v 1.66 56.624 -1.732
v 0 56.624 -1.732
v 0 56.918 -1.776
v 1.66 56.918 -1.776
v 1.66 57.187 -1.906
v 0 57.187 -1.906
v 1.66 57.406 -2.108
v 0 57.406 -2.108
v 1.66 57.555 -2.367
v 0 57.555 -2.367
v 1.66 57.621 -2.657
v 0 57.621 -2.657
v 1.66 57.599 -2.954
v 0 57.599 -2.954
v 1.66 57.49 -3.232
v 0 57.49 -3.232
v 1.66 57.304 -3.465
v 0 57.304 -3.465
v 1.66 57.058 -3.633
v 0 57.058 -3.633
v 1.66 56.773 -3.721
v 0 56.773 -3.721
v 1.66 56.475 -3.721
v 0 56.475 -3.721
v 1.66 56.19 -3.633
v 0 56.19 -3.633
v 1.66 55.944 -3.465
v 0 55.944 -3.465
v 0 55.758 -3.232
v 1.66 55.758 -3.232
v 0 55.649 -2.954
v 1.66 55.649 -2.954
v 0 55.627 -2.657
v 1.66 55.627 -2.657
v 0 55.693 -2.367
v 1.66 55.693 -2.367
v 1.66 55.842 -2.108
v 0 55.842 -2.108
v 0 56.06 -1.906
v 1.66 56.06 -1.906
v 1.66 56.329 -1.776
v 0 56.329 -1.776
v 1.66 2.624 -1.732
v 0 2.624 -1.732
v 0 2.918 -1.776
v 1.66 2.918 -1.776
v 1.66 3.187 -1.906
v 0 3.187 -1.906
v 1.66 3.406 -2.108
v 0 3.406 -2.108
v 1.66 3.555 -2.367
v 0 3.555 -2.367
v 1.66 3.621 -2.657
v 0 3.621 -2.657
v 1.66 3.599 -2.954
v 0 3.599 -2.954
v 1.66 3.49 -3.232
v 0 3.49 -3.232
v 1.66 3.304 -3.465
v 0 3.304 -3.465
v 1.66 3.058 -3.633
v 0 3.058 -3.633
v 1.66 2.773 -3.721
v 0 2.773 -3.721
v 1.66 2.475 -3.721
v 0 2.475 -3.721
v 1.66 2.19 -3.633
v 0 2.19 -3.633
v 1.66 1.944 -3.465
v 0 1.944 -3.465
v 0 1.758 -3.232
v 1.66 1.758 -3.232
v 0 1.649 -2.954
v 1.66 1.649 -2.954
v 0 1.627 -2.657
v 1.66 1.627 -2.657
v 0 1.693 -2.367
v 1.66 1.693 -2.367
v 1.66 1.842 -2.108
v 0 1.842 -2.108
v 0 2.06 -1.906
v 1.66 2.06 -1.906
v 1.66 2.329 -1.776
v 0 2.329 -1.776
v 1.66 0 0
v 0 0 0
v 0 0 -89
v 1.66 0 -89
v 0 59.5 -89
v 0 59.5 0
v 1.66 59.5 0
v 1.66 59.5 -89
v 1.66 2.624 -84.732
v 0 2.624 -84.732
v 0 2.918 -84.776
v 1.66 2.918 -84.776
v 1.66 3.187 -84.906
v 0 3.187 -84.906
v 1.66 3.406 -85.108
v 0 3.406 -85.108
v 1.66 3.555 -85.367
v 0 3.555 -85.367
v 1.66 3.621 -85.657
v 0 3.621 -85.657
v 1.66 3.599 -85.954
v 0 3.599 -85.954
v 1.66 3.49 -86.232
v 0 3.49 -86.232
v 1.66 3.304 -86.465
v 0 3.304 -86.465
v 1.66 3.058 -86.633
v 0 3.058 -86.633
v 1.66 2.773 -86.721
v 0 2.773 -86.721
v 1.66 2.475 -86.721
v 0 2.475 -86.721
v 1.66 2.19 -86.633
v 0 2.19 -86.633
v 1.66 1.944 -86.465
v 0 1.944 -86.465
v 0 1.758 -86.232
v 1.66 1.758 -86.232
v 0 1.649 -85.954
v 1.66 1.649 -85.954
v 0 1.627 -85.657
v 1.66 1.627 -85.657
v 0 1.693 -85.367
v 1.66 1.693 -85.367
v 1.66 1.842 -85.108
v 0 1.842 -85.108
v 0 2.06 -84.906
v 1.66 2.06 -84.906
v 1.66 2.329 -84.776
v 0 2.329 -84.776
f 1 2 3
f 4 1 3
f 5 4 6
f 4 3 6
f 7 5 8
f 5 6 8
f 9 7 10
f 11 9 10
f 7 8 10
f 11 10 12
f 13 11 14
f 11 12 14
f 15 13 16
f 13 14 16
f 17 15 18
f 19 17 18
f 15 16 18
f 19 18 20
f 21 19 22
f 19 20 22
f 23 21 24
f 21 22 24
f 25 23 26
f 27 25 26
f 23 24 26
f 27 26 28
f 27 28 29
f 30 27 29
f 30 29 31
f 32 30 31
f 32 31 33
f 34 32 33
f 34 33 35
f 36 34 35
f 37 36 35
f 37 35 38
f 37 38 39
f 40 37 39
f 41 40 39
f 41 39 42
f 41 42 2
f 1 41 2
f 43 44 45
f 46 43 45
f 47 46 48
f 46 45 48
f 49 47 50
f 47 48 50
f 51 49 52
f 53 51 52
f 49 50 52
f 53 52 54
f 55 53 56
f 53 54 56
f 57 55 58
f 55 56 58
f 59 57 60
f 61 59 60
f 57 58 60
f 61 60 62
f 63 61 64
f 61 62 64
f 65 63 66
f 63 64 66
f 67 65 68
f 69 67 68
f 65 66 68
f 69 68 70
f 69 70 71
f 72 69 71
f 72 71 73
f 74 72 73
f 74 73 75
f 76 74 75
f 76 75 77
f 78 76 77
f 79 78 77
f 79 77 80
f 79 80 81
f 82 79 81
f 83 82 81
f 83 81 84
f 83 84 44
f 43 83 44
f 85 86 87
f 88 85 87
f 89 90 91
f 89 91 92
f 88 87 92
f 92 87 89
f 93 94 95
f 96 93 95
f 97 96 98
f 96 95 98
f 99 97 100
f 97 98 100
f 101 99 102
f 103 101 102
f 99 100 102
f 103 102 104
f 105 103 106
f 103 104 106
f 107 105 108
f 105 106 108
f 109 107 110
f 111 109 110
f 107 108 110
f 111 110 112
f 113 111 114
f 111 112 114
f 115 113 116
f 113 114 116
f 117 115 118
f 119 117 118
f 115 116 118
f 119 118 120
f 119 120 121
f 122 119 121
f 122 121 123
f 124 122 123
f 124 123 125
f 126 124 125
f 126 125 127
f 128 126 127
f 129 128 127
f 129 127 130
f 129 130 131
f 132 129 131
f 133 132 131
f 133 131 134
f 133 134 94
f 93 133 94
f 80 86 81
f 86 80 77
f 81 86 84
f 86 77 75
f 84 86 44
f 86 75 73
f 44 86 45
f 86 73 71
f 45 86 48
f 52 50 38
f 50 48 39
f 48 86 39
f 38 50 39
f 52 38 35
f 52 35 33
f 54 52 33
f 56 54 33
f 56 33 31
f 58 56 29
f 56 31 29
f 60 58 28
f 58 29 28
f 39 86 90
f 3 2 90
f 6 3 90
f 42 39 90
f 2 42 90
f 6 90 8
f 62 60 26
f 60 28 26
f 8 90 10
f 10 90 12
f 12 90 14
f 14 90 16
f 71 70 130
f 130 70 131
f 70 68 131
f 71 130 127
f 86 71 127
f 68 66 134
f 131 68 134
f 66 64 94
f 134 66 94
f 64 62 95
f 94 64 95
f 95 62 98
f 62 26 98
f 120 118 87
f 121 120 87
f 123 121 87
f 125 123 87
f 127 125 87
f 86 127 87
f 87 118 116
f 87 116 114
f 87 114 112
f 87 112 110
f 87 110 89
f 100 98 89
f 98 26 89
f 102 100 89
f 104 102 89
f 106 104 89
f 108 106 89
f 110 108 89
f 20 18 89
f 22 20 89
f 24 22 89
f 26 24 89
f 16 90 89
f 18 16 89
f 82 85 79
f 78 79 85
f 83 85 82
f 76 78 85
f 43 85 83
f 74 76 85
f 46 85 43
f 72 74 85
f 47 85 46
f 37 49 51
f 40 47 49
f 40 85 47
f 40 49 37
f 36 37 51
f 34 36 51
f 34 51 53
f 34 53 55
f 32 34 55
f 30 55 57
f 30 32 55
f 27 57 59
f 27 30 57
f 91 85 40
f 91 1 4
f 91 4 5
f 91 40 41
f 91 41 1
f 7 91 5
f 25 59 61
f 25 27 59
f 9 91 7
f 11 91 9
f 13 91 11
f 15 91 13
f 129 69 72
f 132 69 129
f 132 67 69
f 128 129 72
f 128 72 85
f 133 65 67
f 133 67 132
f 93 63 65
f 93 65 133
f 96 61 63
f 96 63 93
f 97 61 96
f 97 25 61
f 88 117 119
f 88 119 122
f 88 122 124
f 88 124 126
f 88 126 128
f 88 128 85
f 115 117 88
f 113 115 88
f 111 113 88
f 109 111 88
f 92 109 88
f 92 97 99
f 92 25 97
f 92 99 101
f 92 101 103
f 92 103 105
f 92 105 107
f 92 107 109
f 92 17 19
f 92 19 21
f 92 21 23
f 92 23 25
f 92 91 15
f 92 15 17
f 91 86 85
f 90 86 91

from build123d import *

# Parameters (mm, degrees)
ESBO_O1_W                = 89
ESBO_O1_H                = 59.5
RESSALTO_EXTRUS_O1_DEPTH = 1.66
ESBO_O2_R                = 1
CORTE_EXTRUS_O1_DEPTH    = 2.66


with BuildPart() as part:
    # Esboço1 → Ressalto-extrusão1 (new body)
    with BuildSketch(Plane(origin=(0, 0, 0), x_dir=(0, 0, -1), z_dir=(1, 0, 0))):
        with Locations((44.5, 29.75)):
            Rectangle(ESBO_O1_W, ESBO_O1_H)
    extrude(amount=RESSALTO_EXTRUS_O1_DEPTH)

    # Esboço2 → Corte-extrusão1 (cut, through all)
    with BuildSketch(Plane.ZY):
        with Locations((-85.731930575, 2.62372378)):
            Circle(ESBO_O2_R)
        with Locations((-2.731930575, 2.62372378)):
            Circle(ESBO_O2_R)
        with Locations((-2.731930575, 56.62372378)):
            Circle(ESBO_O2_R)
    extrude(amount=-CORTE_EXTRUS_O1_DEPTH, mode=Mode.SUBTRACT)


solid = part.part
